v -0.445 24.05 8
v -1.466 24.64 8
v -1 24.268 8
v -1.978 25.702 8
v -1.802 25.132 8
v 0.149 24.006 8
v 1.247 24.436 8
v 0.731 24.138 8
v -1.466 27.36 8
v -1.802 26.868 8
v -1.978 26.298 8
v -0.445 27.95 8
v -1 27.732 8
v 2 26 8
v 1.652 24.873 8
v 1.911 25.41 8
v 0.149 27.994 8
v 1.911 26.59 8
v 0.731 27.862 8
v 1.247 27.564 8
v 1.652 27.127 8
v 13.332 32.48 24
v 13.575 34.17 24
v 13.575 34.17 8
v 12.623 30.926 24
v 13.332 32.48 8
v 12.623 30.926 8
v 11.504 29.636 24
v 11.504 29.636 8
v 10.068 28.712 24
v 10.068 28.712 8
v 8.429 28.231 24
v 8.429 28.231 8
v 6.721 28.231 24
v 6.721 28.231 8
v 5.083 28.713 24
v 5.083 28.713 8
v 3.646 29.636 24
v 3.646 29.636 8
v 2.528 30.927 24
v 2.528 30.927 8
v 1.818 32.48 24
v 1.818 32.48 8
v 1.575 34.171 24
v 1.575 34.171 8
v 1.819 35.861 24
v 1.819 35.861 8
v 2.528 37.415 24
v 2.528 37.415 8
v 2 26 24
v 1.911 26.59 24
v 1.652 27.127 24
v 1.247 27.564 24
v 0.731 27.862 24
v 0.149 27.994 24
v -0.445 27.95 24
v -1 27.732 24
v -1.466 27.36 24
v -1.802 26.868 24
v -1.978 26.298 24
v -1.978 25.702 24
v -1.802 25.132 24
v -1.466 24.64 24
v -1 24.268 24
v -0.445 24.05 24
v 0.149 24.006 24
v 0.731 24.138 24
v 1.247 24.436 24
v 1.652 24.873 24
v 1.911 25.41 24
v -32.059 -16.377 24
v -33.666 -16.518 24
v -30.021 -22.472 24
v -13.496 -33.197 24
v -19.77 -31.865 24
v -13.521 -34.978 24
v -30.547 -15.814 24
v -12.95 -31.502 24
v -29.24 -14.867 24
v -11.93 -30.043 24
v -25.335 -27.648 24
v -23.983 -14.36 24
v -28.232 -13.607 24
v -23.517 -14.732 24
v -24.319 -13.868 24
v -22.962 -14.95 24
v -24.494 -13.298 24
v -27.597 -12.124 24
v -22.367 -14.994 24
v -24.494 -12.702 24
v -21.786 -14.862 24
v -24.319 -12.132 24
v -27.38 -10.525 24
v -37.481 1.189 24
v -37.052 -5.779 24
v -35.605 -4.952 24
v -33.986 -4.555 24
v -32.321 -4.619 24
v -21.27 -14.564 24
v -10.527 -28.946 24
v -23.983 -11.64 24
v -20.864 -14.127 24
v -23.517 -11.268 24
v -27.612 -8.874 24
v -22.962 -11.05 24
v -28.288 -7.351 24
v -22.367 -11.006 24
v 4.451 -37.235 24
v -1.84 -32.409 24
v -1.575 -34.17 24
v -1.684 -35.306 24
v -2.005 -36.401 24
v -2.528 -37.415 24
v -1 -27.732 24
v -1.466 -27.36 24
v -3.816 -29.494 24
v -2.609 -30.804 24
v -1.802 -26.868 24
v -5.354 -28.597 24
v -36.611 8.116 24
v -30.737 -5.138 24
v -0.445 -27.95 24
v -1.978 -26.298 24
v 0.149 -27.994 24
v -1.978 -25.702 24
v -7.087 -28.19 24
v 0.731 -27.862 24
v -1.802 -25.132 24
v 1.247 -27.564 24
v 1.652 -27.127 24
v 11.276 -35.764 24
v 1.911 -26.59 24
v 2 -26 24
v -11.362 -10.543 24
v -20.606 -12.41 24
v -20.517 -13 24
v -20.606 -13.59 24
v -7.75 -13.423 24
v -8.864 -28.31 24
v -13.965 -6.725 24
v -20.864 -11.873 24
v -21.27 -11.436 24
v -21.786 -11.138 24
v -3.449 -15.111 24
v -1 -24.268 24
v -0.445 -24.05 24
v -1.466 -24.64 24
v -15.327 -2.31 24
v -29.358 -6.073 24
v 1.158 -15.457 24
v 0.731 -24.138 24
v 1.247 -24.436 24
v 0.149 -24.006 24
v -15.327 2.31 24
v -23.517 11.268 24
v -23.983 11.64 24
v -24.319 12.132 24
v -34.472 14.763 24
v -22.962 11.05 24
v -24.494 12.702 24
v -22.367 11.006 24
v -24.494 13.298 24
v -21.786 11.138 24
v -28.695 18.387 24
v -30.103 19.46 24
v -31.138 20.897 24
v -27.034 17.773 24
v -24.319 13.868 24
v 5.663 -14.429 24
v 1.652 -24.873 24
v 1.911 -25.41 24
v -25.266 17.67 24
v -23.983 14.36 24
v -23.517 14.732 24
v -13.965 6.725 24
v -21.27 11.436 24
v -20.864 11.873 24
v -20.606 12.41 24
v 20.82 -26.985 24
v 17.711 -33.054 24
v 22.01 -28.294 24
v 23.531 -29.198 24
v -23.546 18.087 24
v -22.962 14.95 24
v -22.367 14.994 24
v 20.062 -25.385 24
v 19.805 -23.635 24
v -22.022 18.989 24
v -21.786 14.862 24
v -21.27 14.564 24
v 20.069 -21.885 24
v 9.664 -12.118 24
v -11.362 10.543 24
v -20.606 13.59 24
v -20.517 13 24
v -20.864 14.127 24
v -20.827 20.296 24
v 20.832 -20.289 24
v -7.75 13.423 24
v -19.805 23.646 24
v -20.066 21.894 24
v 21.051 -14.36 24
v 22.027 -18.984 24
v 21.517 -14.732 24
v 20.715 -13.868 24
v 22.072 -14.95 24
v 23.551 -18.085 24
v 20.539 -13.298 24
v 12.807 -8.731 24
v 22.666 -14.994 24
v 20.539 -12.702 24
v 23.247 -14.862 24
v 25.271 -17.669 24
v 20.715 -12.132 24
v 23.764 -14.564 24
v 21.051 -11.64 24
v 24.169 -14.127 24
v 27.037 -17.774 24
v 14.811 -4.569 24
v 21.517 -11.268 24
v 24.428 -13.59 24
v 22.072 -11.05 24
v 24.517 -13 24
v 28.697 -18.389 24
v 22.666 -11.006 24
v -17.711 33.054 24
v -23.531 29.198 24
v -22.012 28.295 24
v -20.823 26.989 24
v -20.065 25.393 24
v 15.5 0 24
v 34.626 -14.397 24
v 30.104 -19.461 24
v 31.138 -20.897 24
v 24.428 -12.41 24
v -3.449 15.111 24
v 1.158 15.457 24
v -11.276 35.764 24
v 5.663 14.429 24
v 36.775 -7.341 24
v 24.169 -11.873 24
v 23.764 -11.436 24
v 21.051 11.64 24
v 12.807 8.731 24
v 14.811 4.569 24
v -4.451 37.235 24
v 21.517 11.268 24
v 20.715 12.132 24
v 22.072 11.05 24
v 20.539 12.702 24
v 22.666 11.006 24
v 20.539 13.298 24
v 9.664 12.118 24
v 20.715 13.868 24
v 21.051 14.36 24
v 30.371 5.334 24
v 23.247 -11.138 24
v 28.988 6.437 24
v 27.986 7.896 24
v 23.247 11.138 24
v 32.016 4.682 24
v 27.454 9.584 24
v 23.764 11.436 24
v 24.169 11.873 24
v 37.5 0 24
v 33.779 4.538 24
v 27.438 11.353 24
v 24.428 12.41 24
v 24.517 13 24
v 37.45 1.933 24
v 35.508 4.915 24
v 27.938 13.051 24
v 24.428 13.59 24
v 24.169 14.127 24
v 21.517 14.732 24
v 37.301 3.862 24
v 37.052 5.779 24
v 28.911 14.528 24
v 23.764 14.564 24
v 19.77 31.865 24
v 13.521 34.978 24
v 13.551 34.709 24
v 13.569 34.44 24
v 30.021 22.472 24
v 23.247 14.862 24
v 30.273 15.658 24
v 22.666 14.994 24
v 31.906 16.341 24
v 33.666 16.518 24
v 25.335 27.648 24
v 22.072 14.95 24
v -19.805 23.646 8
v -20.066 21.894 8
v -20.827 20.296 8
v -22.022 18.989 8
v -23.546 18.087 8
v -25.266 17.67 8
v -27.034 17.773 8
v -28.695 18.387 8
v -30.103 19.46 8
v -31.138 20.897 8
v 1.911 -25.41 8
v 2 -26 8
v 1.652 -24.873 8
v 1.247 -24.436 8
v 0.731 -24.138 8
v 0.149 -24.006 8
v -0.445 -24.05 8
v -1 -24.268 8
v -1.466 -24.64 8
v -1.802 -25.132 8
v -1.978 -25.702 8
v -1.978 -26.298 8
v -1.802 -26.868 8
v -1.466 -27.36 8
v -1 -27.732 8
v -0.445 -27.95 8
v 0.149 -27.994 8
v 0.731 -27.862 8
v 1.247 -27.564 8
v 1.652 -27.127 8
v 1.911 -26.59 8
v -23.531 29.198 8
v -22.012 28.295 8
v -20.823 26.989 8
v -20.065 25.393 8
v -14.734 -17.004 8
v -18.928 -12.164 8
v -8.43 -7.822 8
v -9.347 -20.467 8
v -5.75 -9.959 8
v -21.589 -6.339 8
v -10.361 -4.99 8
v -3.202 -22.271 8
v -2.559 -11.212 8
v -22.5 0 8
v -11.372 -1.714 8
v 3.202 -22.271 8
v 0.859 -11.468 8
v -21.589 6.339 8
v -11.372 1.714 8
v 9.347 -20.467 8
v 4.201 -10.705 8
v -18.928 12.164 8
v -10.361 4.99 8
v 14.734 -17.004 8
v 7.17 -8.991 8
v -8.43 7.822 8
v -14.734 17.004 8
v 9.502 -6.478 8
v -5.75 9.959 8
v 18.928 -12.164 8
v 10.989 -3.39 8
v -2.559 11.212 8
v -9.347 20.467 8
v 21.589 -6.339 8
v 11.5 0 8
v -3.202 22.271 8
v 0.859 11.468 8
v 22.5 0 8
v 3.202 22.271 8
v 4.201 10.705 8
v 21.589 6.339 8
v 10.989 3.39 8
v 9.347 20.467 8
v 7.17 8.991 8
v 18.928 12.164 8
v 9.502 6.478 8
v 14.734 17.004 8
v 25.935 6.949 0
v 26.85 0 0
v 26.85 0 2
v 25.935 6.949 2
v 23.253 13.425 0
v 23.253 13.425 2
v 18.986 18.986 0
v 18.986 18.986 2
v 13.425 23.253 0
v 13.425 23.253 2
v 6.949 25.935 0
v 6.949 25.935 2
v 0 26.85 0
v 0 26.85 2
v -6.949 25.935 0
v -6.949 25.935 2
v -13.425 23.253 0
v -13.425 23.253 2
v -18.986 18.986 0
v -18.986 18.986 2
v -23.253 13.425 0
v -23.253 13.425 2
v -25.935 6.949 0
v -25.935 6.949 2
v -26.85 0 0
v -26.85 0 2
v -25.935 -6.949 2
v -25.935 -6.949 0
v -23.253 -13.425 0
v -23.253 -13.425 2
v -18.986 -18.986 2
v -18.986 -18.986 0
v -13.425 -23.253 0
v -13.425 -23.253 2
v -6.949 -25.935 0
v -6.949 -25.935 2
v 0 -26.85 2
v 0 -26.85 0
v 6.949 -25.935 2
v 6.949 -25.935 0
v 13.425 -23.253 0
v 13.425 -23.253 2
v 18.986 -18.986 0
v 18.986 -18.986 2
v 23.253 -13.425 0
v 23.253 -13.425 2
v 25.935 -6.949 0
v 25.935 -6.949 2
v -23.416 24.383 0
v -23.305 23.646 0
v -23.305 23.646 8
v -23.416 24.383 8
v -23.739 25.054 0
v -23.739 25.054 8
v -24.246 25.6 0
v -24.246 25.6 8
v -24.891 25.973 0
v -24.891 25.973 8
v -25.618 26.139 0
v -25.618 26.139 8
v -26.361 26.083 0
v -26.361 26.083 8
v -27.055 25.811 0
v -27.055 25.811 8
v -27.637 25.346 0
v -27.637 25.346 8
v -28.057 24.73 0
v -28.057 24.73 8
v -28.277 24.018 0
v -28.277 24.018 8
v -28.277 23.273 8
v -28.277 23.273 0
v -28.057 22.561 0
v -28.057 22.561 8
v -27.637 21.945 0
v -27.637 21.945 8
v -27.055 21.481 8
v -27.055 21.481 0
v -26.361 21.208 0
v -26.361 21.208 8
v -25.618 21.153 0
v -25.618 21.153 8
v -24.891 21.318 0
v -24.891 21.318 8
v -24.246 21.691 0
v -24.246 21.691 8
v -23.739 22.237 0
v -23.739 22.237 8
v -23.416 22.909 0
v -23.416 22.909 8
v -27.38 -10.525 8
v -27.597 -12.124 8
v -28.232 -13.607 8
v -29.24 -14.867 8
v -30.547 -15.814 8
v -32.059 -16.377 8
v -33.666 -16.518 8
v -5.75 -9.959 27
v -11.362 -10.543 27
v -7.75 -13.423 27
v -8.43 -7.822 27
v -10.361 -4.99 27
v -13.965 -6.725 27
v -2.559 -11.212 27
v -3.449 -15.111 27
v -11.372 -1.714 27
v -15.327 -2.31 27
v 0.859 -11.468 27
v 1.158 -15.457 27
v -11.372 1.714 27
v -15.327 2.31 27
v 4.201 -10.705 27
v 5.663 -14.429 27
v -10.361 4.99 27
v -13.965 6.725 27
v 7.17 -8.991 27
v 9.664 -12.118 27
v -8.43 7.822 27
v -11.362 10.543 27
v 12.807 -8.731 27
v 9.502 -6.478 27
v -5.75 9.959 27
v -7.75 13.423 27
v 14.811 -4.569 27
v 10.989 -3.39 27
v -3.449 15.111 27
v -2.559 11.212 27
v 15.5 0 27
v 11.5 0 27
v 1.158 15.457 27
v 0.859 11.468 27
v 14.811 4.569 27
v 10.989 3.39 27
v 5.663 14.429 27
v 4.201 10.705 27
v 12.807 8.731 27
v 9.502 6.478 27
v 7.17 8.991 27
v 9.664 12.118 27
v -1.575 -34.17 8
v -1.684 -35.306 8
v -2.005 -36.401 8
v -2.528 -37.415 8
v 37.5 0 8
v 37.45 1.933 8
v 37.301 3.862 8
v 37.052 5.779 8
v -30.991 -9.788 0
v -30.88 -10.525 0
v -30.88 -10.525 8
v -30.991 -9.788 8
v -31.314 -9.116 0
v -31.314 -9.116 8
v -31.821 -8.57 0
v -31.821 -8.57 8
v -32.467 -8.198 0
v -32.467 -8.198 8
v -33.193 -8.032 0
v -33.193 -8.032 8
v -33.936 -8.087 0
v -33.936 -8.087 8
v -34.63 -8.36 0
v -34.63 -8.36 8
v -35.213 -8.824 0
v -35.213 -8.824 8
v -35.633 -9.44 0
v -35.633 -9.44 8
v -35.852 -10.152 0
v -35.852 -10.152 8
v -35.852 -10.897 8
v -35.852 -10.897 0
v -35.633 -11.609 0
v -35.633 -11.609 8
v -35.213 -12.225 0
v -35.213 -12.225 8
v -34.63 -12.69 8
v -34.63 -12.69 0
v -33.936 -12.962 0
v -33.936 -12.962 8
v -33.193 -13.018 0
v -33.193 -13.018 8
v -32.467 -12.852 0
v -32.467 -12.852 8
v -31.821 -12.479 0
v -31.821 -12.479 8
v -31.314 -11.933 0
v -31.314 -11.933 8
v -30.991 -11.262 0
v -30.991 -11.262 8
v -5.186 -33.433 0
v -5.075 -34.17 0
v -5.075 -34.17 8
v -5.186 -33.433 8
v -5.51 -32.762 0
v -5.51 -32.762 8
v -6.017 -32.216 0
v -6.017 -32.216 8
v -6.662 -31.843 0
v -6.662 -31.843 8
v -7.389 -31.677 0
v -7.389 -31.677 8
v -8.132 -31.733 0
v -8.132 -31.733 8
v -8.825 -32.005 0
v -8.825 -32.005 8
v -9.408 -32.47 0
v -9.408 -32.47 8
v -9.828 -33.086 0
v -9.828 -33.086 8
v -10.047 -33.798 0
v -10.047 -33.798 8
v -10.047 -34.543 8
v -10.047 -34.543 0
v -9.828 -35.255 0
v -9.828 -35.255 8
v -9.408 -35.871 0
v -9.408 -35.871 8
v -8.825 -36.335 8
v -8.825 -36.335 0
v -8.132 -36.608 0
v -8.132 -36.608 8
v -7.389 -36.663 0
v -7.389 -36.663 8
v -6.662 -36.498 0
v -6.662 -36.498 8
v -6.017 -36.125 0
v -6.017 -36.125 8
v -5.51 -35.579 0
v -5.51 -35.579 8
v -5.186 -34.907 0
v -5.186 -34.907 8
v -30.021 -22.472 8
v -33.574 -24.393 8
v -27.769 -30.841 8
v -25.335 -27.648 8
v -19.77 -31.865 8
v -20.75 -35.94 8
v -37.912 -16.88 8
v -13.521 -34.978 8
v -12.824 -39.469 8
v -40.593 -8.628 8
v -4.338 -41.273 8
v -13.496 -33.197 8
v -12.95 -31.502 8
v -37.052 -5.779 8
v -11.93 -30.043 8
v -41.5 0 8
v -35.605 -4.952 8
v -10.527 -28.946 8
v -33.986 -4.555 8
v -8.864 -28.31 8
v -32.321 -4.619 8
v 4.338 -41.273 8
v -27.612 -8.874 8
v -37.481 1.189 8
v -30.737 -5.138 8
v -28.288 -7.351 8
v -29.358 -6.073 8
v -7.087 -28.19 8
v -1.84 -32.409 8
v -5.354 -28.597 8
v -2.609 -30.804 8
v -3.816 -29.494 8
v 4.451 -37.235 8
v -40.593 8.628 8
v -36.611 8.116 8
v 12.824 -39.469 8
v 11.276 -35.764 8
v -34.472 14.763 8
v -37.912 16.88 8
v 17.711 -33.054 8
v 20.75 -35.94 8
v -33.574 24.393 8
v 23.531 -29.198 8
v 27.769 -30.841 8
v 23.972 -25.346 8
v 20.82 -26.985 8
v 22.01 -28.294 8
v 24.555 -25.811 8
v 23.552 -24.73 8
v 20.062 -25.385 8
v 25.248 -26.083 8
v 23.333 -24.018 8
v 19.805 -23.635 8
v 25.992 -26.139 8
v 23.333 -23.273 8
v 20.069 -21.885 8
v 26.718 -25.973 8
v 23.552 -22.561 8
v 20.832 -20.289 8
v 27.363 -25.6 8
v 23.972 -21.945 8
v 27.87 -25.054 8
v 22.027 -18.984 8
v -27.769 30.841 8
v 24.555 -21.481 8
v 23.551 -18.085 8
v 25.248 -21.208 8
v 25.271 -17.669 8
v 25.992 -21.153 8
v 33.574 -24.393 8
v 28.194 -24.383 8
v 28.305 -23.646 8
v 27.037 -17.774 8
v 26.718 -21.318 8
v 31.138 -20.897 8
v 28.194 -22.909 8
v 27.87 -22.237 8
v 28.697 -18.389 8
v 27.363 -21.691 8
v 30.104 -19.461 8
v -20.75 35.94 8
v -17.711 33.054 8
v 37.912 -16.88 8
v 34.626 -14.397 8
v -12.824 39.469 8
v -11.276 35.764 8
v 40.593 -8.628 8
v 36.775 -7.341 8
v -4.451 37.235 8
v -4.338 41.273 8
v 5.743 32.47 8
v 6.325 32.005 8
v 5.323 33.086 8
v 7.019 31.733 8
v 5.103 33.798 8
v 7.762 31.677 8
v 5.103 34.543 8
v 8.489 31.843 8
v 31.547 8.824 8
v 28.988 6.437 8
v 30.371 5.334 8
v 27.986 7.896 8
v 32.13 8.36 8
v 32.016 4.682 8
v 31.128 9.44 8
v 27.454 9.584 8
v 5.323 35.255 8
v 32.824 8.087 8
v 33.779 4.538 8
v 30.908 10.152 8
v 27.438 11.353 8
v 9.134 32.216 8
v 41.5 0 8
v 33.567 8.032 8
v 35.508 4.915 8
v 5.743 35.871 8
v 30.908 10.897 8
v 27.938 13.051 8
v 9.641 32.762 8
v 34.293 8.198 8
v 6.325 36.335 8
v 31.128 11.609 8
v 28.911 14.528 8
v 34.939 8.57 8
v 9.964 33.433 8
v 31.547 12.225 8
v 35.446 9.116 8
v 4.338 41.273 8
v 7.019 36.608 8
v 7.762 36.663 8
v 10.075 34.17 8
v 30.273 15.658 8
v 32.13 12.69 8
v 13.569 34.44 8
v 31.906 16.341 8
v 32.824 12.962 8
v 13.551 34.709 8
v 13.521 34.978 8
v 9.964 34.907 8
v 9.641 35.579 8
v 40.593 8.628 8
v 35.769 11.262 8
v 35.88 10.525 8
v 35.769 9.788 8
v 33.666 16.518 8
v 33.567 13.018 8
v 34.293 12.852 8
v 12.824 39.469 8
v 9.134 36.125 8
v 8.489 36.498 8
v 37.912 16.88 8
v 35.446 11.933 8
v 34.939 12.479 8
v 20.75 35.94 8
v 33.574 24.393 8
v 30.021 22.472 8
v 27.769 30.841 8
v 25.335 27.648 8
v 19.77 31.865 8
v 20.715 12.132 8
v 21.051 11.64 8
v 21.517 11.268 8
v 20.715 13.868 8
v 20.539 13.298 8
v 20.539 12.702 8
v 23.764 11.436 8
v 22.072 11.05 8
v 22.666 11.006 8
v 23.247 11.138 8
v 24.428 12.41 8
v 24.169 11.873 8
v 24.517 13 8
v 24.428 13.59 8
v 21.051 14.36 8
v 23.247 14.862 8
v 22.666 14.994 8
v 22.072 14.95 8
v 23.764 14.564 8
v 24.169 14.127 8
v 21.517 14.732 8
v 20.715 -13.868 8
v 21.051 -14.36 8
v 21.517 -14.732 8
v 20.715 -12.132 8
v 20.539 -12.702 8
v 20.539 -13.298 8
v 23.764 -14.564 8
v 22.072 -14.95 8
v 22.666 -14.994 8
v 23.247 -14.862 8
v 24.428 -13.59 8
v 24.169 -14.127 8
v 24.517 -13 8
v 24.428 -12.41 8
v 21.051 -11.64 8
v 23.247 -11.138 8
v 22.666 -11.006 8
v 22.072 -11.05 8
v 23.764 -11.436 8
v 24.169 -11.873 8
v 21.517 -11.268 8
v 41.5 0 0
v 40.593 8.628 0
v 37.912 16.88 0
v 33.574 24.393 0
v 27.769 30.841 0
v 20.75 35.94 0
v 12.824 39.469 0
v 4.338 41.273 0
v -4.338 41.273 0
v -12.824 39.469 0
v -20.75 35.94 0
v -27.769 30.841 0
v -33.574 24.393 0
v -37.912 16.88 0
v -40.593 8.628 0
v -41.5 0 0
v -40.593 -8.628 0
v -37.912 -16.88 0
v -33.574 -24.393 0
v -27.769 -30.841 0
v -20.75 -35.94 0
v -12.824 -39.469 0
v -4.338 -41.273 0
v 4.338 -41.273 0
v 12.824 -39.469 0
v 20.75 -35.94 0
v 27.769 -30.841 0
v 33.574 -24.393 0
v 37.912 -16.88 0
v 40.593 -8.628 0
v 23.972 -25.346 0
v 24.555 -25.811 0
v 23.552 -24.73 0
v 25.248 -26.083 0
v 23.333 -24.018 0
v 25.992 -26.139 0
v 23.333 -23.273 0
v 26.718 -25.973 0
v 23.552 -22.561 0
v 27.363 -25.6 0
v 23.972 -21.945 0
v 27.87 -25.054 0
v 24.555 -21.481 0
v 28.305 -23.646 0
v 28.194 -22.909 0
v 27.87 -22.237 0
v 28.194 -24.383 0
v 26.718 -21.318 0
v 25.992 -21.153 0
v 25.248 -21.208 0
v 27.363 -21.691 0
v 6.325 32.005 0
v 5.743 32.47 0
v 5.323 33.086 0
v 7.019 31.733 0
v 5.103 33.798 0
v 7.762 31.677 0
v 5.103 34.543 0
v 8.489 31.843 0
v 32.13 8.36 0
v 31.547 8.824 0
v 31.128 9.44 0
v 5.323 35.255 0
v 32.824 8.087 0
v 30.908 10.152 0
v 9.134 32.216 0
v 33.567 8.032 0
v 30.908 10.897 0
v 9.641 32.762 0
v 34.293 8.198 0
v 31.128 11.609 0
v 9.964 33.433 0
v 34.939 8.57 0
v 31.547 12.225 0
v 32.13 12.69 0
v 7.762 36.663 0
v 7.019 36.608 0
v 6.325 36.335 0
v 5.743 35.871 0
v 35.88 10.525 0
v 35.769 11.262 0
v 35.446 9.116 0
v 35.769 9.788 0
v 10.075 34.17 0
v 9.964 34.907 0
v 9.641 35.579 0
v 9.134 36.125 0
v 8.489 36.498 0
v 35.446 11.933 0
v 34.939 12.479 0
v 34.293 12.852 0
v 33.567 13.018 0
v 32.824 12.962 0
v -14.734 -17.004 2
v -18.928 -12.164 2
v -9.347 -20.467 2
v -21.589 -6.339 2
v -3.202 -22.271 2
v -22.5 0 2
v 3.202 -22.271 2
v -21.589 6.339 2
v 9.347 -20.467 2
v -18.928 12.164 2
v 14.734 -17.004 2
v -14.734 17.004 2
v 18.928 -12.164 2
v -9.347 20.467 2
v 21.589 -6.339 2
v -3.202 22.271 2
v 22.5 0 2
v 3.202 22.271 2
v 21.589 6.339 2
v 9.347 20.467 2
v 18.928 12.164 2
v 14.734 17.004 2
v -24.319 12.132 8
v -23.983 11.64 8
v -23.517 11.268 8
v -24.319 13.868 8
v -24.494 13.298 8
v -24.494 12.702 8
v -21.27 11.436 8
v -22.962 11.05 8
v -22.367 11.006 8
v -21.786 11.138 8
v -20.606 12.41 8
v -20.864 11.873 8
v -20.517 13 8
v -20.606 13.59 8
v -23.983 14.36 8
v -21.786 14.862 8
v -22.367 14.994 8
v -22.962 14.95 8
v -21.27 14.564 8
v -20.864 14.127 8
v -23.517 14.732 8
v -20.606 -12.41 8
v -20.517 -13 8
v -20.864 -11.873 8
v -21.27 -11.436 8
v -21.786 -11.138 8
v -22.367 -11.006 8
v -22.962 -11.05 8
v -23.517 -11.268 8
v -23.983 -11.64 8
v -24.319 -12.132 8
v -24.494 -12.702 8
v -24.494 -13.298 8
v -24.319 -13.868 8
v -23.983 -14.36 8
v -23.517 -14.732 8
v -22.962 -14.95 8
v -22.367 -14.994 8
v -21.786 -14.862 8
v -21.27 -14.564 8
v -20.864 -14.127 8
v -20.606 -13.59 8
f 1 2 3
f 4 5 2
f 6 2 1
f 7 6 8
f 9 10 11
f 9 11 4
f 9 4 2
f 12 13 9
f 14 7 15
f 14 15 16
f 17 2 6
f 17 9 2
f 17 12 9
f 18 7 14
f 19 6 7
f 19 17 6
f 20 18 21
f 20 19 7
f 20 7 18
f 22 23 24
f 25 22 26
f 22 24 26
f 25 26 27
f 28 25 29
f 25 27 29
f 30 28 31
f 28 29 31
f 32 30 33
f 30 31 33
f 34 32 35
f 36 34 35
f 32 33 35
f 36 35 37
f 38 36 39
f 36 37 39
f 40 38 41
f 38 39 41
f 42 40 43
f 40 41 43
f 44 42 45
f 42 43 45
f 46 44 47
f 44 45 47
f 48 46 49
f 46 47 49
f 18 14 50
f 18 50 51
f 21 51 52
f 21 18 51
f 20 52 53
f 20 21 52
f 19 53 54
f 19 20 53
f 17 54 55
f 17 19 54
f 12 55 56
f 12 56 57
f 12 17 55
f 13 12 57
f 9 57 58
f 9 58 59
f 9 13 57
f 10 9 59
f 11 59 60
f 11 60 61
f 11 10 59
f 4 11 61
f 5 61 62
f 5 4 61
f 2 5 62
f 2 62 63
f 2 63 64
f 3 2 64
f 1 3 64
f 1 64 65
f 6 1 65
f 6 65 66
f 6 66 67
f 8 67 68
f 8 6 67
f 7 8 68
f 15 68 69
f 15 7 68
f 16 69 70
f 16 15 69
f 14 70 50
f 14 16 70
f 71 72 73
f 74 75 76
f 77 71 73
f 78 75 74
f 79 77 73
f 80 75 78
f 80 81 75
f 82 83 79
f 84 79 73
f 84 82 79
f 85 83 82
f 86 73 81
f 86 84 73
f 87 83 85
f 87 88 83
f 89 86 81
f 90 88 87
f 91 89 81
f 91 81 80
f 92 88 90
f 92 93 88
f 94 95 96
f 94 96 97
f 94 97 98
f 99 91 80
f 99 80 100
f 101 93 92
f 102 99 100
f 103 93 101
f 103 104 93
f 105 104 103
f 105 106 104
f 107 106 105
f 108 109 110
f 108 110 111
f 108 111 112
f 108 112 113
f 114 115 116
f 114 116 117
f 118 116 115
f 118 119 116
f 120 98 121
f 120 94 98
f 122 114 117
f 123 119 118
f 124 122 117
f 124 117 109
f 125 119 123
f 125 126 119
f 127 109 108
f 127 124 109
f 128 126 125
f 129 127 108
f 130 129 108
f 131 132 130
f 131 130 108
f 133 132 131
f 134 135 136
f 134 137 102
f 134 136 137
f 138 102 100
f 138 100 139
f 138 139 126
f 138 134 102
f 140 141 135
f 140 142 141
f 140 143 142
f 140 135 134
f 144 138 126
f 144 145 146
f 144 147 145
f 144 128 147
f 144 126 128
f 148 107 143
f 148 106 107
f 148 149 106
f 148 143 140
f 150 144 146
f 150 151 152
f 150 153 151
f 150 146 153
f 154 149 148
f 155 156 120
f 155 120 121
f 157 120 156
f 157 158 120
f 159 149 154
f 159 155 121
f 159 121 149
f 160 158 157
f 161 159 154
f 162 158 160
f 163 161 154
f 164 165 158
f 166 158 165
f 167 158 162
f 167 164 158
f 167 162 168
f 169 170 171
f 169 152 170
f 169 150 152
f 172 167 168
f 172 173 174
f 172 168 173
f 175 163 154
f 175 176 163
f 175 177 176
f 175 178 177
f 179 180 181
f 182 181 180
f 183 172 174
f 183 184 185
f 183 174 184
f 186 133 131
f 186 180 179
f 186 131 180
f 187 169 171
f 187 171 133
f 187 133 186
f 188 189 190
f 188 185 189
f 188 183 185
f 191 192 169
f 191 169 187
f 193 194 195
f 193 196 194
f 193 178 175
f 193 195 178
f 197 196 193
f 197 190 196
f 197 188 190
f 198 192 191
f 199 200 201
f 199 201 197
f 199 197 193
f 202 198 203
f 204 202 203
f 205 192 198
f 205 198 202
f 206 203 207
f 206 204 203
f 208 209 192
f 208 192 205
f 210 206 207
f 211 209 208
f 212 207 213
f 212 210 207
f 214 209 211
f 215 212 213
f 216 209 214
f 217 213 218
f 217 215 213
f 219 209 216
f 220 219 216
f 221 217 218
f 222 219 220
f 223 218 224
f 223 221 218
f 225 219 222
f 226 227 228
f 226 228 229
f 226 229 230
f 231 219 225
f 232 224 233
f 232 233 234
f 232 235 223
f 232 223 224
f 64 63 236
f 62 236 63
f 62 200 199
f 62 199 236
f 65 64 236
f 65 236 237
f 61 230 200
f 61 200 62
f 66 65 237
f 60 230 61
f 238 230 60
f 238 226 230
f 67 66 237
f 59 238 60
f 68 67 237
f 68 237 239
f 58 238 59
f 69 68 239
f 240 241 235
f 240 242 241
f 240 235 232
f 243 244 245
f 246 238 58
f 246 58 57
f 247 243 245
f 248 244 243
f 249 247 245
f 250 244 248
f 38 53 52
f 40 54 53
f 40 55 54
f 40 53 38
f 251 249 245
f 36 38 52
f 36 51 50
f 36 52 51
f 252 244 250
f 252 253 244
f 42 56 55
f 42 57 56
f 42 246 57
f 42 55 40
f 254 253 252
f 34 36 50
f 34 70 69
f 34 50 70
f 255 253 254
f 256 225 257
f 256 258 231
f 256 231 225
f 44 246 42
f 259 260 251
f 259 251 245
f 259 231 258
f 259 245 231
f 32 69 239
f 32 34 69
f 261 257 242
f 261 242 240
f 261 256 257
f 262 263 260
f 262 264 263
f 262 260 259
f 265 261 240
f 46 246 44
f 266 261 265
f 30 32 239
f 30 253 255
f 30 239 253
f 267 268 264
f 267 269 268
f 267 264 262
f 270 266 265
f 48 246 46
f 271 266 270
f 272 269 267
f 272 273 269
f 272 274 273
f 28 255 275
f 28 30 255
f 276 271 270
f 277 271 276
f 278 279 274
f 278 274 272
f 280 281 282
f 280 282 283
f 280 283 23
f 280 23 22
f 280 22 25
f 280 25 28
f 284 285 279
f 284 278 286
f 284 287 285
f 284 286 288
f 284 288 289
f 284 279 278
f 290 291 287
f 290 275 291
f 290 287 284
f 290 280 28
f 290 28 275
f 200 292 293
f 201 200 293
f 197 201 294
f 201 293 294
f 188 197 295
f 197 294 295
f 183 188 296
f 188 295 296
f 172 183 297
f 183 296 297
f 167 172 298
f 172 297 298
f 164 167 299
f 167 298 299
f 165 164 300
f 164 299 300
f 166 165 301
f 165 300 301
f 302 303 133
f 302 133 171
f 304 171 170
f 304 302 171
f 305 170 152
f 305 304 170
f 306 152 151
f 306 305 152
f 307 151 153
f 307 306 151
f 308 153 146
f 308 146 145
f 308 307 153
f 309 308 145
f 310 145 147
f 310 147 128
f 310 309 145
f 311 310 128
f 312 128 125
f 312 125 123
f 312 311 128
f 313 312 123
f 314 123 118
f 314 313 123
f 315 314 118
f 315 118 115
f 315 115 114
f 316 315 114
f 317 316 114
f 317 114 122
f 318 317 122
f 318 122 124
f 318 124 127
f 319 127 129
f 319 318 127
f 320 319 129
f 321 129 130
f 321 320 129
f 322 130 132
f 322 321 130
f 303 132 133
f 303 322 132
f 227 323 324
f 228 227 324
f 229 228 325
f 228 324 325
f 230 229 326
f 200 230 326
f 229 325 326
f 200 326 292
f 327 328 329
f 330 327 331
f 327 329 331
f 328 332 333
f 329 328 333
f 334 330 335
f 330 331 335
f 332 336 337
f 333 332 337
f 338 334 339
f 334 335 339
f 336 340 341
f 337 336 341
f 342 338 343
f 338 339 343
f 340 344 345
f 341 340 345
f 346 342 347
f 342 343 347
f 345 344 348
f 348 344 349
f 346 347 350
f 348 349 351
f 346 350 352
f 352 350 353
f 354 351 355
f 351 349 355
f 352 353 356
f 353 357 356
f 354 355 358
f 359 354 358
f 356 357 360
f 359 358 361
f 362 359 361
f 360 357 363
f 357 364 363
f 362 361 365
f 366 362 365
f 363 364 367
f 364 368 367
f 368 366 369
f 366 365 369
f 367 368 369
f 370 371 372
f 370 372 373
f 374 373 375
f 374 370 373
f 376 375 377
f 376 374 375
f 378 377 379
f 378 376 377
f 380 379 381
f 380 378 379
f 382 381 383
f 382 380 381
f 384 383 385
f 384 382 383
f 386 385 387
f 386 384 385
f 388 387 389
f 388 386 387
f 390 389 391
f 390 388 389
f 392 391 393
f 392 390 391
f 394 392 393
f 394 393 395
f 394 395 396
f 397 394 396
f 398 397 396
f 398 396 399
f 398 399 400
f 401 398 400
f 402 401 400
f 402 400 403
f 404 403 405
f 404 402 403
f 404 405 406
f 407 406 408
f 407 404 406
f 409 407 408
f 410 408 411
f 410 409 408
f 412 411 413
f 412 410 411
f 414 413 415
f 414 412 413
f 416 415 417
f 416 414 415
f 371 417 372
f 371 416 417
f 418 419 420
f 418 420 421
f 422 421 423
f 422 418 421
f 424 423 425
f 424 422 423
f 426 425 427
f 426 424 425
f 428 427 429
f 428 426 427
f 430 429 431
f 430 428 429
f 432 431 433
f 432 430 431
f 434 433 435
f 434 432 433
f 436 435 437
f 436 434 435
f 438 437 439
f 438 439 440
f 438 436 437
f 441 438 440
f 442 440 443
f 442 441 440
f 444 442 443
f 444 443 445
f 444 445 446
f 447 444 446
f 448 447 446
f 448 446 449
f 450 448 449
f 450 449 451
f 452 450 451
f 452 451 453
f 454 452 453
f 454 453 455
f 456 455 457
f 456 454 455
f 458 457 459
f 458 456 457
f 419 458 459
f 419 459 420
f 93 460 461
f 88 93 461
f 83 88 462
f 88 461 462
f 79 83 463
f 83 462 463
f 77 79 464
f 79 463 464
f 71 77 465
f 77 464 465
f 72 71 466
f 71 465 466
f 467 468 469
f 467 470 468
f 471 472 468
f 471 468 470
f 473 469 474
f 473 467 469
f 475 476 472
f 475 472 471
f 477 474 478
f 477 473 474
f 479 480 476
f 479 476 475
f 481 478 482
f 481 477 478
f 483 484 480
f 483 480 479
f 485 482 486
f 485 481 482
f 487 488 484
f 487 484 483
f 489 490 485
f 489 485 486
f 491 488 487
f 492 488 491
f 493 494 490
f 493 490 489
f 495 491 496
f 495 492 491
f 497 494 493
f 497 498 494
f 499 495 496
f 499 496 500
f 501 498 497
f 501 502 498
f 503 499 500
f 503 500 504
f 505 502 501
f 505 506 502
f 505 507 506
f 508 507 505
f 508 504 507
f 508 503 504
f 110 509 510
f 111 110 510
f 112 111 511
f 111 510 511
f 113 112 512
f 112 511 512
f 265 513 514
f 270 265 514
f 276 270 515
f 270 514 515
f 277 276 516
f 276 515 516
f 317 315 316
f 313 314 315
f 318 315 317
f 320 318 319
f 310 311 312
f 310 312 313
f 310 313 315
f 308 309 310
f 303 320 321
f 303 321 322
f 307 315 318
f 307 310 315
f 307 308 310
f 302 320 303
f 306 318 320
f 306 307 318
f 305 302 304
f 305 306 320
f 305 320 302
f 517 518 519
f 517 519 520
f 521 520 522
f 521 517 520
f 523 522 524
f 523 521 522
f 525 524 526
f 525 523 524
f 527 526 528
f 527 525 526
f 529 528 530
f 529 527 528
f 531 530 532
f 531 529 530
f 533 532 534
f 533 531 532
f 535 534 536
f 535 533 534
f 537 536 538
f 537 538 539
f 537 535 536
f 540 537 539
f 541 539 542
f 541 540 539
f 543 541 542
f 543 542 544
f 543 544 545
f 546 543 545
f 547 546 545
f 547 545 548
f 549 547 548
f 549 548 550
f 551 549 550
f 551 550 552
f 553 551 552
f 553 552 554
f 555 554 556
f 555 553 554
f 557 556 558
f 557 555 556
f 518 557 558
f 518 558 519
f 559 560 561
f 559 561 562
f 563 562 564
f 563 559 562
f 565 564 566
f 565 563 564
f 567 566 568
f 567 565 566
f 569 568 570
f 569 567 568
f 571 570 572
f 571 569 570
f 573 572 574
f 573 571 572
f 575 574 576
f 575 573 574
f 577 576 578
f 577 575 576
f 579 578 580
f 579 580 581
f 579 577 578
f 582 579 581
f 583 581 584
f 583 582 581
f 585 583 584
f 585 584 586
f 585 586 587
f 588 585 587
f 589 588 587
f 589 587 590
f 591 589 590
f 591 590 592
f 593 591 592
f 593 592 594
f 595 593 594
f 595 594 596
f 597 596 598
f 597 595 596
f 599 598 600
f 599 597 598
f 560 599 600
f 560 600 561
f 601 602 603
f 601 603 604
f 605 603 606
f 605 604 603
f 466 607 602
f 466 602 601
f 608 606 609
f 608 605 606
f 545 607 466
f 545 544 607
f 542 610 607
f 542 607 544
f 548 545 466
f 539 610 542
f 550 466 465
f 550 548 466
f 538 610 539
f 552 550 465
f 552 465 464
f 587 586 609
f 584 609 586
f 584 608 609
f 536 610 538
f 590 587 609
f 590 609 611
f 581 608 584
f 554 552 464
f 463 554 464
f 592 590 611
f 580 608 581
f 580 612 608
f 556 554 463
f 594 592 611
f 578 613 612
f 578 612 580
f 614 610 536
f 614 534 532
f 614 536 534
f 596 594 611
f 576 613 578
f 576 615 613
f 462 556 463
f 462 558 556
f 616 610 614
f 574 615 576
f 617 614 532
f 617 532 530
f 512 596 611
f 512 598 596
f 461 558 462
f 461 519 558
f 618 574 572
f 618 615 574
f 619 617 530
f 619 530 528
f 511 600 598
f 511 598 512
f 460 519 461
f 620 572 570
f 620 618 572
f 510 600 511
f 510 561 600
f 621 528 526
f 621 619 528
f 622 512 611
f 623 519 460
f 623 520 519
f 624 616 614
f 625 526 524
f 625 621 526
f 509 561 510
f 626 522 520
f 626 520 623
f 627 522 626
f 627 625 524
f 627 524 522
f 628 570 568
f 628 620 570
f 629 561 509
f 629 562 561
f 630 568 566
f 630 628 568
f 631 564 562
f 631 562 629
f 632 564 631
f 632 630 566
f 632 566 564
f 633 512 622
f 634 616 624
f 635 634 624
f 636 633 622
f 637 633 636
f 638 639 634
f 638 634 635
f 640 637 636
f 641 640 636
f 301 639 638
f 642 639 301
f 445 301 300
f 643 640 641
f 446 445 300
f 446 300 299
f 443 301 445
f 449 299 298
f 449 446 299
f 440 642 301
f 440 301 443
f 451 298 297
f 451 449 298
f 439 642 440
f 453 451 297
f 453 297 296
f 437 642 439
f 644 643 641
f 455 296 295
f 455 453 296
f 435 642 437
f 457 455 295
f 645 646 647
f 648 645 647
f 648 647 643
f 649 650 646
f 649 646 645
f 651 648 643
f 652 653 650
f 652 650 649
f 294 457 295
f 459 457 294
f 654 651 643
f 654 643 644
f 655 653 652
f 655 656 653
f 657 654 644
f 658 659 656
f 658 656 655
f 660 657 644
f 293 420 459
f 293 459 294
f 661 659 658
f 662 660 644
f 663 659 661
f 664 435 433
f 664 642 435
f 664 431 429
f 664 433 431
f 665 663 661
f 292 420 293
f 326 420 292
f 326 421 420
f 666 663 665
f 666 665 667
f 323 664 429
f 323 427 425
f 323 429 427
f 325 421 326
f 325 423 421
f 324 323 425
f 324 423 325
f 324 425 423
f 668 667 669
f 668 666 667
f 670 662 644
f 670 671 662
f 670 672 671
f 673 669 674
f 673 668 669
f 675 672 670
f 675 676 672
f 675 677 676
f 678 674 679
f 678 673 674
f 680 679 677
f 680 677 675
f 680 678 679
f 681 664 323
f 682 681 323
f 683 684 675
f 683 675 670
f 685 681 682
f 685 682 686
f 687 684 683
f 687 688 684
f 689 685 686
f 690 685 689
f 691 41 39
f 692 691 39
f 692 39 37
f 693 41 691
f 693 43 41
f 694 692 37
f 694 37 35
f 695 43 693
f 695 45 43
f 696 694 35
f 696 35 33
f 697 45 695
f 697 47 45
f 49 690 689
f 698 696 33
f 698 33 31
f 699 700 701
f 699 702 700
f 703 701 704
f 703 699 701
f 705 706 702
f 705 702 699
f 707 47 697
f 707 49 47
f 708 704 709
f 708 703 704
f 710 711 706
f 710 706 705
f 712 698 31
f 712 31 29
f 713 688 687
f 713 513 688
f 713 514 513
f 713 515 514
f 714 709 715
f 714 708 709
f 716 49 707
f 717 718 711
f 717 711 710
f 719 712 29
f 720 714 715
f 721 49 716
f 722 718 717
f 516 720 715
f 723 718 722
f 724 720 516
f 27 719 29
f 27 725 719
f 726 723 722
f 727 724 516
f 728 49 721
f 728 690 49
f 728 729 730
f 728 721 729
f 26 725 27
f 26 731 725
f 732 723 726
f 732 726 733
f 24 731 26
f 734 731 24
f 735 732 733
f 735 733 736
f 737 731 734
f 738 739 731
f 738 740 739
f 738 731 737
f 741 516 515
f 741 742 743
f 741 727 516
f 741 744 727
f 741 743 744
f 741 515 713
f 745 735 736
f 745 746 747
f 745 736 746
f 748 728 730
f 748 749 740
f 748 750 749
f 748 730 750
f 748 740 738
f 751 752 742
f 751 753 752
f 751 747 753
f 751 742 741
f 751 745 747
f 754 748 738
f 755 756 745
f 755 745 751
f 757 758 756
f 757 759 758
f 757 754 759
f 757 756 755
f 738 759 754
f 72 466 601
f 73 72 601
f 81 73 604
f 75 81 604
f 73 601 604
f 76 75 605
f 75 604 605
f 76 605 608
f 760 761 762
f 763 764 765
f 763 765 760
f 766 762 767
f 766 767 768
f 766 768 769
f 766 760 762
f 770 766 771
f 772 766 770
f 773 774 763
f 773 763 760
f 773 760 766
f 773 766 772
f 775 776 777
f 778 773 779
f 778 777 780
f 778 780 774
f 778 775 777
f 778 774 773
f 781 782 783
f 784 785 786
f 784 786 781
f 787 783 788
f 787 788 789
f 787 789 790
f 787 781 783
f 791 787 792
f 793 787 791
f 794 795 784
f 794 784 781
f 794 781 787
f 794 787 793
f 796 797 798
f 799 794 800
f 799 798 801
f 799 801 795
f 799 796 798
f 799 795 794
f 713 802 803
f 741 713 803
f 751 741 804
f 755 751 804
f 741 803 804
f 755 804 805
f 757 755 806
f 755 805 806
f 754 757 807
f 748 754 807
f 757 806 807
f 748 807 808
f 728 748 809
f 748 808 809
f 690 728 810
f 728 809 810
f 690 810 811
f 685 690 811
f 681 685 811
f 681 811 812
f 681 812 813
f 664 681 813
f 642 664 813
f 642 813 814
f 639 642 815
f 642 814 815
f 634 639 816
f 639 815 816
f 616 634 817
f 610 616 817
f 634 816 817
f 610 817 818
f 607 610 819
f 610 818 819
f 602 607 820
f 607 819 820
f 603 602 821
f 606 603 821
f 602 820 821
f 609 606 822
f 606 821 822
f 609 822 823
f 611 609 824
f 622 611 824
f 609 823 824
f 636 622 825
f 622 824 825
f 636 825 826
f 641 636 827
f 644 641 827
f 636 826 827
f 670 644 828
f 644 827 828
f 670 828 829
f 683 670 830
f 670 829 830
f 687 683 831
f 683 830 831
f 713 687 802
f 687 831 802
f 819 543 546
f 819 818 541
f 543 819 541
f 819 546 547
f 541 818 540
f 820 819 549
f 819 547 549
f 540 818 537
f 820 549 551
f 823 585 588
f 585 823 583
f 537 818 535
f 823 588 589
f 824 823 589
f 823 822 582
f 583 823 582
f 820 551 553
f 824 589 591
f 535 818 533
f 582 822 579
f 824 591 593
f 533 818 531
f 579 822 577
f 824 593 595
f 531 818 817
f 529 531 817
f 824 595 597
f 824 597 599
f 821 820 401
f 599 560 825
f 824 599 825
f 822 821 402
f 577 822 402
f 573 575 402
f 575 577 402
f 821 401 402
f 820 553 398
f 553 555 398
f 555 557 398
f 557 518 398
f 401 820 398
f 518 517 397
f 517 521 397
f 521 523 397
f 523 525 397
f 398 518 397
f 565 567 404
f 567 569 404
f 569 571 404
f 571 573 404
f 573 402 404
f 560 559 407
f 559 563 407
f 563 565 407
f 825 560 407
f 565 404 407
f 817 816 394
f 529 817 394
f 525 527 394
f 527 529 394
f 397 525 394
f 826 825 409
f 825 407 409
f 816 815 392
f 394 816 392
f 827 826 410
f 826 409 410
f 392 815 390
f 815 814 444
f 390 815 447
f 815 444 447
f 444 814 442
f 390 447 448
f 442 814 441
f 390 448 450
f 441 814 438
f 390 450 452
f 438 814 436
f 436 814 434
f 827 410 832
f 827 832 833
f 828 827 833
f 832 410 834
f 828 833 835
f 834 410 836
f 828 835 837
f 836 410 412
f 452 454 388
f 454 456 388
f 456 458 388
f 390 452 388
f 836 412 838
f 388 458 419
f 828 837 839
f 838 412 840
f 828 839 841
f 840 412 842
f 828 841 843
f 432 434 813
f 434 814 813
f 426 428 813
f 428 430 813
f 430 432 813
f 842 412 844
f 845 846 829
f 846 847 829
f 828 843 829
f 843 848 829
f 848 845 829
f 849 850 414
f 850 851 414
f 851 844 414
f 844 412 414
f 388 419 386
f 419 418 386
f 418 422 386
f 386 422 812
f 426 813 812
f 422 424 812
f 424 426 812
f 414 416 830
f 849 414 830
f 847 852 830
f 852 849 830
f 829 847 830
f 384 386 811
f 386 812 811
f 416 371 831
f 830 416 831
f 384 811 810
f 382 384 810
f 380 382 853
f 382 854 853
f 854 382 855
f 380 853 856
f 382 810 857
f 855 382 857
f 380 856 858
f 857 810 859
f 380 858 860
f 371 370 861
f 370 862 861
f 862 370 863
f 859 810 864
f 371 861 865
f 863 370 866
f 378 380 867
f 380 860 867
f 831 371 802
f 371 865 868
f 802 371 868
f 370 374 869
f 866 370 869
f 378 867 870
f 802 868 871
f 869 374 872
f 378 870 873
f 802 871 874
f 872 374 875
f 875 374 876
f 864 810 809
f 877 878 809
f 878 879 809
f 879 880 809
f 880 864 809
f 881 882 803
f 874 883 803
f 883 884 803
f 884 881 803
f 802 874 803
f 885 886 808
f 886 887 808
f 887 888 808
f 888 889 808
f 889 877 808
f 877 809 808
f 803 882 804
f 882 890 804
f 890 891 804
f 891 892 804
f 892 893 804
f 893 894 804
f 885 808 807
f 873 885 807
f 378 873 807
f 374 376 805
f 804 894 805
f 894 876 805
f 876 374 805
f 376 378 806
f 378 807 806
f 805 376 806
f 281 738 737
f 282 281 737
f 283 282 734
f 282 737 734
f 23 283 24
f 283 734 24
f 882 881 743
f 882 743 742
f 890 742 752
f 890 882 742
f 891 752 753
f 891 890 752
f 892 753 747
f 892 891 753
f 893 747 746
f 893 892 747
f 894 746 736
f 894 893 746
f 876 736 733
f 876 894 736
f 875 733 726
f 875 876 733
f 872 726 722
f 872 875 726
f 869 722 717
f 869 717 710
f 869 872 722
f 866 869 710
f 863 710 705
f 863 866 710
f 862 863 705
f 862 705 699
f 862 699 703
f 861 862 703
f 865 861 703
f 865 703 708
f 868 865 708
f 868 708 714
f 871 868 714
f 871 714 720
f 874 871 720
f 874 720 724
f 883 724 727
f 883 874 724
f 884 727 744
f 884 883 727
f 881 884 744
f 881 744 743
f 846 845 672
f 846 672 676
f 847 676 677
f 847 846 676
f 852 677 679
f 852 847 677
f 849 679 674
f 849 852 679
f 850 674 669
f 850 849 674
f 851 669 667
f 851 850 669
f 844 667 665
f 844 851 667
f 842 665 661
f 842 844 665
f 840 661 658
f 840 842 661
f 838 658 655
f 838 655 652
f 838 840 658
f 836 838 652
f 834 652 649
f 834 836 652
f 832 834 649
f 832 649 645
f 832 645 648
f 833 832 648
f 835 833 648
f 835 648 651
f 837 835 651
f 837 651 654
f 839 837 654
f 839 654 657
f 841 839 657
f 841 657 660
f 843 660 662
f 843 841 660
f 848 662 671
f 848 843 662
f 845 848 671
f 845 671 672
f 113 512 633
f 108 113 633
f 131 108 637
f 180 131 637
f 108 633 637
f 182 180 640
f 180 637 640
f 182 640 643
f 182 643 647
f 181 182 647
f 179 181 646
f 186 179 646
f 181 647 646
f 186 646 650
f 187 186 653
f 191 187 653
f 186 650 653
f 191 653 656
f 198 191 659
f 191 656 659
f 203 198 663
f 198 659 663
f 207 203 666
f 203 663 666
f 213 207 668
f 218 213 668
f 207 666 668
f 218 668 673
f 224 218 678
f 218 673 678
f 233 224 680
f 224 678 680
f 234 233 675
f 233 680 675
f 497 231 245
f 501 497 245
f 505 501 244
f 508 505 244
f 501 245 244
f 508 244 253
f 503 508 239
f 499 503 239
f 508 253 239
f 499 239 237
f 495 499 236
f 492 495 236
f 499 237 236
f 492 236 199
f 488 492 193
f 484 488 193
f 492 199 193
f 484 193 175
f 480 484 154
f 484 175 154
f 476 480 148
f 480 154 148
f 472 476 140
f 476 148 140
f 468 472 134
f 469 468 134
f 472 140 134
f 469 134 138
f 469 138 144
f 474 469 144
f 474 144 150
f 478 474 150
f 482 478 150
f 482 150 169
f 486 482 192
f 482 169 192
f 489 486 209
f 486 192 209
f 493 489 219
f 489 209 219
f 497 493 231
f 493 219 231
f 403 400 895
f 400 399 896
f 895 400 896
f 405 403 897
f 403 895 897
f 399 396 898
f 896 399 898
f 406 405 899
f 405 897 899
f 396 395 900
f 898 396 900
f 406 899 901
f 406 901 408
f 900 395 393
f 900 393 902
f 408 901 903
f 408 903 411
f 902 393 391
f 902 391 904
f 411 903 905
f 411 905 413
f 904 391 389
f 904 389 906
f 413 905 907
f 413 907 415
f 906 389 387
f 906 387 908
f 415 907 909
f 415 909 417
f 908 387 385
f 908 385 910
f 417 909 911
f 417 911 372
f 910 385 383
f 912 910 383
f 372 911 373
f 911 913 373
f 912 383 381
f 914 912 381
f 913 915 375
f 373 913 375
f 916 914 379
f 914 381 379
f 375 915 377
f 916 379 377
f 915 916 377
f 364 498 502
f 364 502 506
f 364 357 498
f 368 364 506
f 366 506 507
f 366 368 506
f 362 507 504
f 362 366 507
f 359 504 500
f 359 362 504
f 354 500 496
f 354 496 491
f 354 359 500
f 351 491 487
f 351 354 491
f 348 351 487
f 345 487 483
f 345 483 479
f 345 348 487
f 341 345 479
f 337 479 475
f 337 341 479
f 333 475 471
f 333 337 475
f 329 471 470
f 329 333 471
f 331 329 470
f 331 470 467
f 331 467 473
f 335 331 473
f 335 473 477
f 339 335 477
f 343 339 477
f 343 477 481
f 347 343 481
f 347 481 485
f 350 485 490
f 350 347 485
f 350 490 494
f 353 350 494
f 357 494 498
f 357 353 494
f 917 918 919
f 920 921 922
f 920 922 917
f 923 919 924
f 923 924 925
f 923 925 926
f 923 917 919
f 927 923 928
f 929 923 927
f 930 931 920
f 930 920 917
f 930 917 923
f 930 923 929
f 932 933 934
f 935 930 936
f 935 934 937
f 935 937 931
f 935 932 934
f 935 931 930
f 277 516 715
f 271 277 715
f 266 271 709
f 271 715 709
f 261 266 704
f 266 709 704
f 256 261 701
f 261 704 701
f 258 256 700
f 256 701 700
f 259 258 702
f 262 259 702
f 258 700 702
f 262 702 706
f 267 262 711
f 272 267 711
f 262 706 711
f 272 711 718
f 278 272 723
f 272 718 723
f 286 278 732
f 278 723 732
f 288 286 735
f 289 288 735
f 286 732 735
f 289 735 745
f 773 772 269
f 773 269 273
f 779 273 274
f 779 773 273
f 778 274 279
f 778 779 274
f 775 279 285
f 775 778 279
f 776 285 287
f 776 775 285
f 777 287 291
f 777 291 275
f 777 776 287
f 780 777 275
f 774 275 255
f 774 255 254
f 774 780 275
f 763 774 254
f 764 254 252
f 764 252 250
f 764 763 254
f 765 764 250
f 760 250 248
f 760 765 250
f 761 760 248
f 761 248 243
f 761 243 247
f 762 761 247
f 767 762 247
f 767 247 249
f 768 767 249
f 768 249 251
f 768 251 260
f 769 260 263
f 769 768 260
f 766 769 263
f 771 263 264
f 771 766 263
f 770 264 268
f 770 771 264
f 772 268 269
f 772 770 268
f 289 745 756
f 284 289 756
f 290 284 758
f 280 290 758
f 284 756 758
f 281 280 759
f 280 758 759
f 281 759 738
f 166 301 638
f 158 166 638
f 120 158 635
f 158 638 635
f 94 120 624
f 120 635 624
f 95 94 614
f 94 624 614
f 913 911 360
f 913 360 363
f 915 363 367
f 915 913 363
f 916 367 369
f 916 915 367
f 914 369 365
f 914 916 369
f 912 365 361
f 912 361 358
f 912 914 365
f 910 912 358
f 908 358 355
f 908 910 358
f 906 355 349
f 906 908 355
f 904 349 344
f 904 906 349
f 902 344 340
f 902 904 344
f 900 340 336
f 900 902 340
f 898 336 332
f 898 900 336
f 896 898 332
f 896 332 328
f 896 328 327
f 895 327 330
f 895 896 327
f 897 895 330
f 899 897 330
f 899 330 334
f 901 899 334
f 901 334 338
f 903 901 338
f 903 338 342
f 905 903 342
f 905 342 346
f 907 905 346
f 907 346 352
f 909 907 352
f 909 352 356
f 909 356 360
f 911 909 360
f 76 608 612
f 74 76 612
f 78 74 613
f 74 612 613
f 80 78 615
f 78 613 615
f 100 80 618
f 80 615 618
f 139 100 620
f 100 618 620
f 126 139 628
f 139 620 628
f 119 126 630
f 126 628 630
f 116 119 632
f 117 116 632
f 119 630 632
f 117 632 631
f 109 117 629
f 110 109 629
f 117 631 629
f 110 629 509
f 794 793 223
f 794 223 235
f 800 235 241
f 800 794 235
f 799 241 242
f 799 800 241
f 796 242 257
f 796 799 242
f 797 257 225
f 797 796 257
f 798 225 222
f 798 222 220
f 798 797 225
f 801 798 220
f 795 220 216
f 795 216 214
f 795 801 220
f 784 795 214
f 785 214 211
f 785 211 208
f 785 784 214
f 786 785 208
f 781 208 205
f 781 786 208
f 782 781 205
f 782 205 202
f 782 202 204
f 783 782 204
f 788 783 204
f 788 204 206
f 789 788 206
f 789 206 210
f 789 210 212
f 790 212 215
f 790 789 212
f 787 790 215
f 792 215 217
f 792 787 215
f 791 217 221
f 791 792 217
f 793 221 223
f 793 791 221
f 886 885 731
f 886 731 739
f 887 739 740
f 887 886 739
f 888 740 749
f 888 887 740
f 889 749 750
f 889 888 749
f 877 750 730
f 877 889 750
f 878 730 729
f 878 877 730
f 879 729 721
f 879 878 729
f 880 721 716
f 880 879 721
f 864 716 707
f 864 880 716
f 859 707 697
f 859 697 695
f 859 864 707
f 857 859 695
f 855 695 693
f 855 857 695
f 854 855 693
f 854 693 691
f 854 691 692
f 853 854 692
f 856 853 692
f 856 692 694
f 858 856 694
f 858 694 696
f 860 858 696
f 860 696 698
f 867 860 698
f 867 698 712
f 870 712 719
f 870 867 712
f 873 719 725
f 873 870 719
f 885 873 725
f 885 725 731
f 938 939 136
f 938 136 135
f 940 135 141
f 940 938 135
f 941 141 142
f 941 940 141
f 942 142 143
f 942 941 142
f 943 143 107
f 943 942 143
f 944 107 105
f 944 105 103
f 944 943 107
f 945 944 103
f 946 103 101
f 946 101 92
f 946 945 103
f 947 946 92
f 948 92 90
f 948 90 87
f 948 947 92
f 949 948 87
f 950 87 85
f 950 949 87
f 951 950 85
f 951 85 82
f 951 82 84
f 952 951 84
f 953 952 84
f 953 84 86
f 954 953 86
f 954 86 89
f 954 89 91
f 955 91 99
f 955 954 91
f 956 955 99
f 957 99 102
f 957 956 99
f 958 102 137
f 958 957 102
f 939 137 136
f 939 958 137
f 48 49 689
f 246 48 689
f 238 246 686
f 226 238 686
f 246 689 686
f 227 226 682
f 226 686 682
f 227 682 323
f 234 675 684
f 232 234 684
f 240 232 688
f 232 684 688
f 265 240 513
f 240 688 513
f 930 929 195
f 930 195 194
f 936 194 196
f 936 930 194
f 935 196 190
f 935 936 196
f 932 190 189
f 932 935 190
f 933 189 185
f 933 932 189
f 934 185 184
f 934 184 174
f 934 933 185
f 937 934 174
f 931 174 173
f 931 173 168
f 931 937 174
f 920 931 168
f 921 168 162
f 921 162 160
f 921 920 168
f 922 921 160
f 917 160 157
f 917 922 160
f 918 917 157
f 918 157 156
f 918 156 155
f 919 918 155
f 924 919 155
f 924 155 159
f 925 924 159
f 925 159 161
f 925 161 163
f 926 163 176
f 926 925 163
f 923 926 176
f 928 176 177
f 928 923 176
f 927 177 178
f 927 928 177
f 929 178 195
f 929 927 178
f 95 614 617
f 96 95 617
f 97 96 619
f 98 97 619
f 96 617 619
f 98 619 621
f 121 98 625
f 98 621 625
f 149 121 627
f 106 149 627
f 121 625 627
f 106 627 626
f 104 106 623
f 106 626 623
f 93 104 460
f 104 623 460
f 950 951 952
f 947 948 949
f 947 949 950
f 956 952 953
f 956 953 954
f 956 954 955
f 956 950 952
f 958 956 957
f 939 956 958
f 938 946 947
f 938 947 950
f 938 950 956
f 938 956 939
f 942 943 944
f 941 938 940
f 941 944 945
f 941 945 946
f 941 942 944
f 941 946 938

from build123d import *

# Parameters (mm, degrees)
F0_R     = 41.5
F0_R_2   = 2.5
F0_R_3   = 26.85
F0_R_4   = 22.5
F1_DEPTH = 8
F2_DEPTH = 2
F3_R     = 2
F3_R_2   = 22.5
F3_R_3   = 11.5
F4_DEPTH = 16
F5_R     = 15.5
F5_R_2   = 11.5
F6_DEPTH = 3


with BuildPart() as f1:
    # F0 (on Top) → F1 (new body)
    with BuildSketch(Plane.XY):
        Circle(F0_R)
        with Locations((-7.5753864878, -34.1703602492)):
            Circle(F0_R_2, mode=Mode.SUBTRACT)
        with Locations((-33.3800932762, -10.5247029826)):
            Circle(F0_R_2, mode=Mode.SUBTRACT)
        with Locations((25.8047067884, -23.6456572665)):
            Circle(F0_R_2, mode=Mode.SUBTRACT)
        with Locations((-25.8047067884, 23.6456572665)):
            Circle(F0_R_2, mode=Mode.SUBTRACT)
        Circle(F0_R_3, mode=Mode.SUBTRACT)
        with Locations((33.3800932762, 10.5247029826)):
            Circle(F0_R_2, mode=Mode.SUBTRACT)
        with Locations((7.5753864878, 34.1703602492)):
            Circle(F0_R_2, mode=Mode.SUBTRACT)
        Circle(F0_R_3)
        Circle(F0_R_4, mode=Mode.SUBTRACT)
    extrude(amount=F1_DEPTH)

    # F0 (on Top) → F2 (cut)
    with BuildSketch(Plane.XY):
        Circle(F0_R_3)
        Circle(F0_R_4, mode=Mode.SUBTRACT)
    extrude(amount=F2_DEPTH, mode=Mode.SUBTRACT)

    # F3 (on face) → F4 (join)
    with BuildSketch(Plane.XY.offset(8)):
        with BuildLine():
            ThreePointArc((31.1379786303, -20.8968008752), (35.8742539897, -10.9219000491), (37.5, 0))
            ThreePointArc((37.5, 0), (37.3878227586, 2.8983977242), (37.0519621671, 5.7794549545))
            ThreePointArc((37.051962167, 5.7794549545), (27.6577915717, 8.7204681856), (33.6661497309, 16.5178800787))
            ThreePointArc((33.6661497309, 16.5178800787), (25.3346327856, 27.6479001304), (13.5208262729, 34.977667974))
            ThreePointArc((13.5208262729, 34.977667974), (13.5617308945, 34.5749348961), (13.5753864878, 34.1703602492))
            ThreePointArc((13.5753864878, 34.1703602492), (5.8847198032, 28.4134820881), (2.5281711006, 37.4146809539))
            ThreePointArc((2.5281711006, 37.414680954), (-11.2764674814, 35.7643856531), (-23.5311358942, 29.1982130195))
            ThreePointArc((-23.5311358942, 29.1982130195), (-20.8226677798, 26.9892013918), (-19.8047067884, 23.6456572665))
            ThreePointArc((-19.8047067884, 23.6456572665), (-24.390428006, 17.8147211903), (-31.1379786303, 20.8968008752))
            ThreePointArc((-31.1379786303, 20.8968008752), (-36.611100267, 8.1164855227), (-37.051962167, -5.7794549545))
            ThreePointArc((-37.0519621671, -5.7794549545), (-30.7372929948, -5.1380893272), (-27.3800932762, -10.5247029826))
            ThreePointArc((-27.3800932762, -10.5247029826), (-29.2398238845, -14.8673023614), (-33.6661497309, -16.5178800787))
            ThreePointArc((-33.6661497309, -16.5178800787), (-25.3346327856, -27.6479001304), (-13.5208262729, -34.977667974))
            ThreePointArc((-13.5208262729, -34.977667974), (-7.9799611347, -28.1840158425), (-1.5753864878, -34.1703602492))
            ThreePointArc((-1.5753864878, -34.1703602492), (-1.8185083267, -35.8610269338), (-2.5281711006, -37.4146809539))
            ThreePointArc((-2.5281711006, -37.414680954), (11.2764674814, -35.7643856531), (23.5311358942, -29.1982130195))
            ThreePointArc((23.5311358942, -29.1982130195), (21.3810427675, -19.5921160209), (31.1379786303, -20.8968008752))
        make_face()
        with Locations((-22.5166604984, -13)):
            Circle(F3_R, mode=Mode.SUBTRACT)
        with Locations((0, -26)):
            Circle(F3_R, mode=Mode.SUBTRACT)
        with Locations((22.5166604984, -13)):
            Circle(F3_R, mode=Mode.SUBTRACT)
        with Locations((-22.5166604984, 13)):
            Circle(F3_R, mode=Mode.SUBTRACT)
        Circle(F3_R_2, mode=Mode.SUBTRACT)
        with Locations((22.5166604984, 13)):
            Circle(F3_R, mode=Mode.SUBTRACT)
        with Locations((0, 26)):
            Circle(F3_R, mode=Mode.SUBTRACT)
        Circle(F3_R_2)
        Circle(F3_R_3, mode=Mode.SUBTRACT)
    extrude(amount=F4_DEPTH)

    # F5 (on face) → F6 (join)
    with BuildSketch(Plane.XY.offset(24)):
        Circle(F5_R)
        Circle(F5_R_2, mode=Mode.SUBTRACT)
    extrude(amount=F6_DEPTH)


solid = f1.part
